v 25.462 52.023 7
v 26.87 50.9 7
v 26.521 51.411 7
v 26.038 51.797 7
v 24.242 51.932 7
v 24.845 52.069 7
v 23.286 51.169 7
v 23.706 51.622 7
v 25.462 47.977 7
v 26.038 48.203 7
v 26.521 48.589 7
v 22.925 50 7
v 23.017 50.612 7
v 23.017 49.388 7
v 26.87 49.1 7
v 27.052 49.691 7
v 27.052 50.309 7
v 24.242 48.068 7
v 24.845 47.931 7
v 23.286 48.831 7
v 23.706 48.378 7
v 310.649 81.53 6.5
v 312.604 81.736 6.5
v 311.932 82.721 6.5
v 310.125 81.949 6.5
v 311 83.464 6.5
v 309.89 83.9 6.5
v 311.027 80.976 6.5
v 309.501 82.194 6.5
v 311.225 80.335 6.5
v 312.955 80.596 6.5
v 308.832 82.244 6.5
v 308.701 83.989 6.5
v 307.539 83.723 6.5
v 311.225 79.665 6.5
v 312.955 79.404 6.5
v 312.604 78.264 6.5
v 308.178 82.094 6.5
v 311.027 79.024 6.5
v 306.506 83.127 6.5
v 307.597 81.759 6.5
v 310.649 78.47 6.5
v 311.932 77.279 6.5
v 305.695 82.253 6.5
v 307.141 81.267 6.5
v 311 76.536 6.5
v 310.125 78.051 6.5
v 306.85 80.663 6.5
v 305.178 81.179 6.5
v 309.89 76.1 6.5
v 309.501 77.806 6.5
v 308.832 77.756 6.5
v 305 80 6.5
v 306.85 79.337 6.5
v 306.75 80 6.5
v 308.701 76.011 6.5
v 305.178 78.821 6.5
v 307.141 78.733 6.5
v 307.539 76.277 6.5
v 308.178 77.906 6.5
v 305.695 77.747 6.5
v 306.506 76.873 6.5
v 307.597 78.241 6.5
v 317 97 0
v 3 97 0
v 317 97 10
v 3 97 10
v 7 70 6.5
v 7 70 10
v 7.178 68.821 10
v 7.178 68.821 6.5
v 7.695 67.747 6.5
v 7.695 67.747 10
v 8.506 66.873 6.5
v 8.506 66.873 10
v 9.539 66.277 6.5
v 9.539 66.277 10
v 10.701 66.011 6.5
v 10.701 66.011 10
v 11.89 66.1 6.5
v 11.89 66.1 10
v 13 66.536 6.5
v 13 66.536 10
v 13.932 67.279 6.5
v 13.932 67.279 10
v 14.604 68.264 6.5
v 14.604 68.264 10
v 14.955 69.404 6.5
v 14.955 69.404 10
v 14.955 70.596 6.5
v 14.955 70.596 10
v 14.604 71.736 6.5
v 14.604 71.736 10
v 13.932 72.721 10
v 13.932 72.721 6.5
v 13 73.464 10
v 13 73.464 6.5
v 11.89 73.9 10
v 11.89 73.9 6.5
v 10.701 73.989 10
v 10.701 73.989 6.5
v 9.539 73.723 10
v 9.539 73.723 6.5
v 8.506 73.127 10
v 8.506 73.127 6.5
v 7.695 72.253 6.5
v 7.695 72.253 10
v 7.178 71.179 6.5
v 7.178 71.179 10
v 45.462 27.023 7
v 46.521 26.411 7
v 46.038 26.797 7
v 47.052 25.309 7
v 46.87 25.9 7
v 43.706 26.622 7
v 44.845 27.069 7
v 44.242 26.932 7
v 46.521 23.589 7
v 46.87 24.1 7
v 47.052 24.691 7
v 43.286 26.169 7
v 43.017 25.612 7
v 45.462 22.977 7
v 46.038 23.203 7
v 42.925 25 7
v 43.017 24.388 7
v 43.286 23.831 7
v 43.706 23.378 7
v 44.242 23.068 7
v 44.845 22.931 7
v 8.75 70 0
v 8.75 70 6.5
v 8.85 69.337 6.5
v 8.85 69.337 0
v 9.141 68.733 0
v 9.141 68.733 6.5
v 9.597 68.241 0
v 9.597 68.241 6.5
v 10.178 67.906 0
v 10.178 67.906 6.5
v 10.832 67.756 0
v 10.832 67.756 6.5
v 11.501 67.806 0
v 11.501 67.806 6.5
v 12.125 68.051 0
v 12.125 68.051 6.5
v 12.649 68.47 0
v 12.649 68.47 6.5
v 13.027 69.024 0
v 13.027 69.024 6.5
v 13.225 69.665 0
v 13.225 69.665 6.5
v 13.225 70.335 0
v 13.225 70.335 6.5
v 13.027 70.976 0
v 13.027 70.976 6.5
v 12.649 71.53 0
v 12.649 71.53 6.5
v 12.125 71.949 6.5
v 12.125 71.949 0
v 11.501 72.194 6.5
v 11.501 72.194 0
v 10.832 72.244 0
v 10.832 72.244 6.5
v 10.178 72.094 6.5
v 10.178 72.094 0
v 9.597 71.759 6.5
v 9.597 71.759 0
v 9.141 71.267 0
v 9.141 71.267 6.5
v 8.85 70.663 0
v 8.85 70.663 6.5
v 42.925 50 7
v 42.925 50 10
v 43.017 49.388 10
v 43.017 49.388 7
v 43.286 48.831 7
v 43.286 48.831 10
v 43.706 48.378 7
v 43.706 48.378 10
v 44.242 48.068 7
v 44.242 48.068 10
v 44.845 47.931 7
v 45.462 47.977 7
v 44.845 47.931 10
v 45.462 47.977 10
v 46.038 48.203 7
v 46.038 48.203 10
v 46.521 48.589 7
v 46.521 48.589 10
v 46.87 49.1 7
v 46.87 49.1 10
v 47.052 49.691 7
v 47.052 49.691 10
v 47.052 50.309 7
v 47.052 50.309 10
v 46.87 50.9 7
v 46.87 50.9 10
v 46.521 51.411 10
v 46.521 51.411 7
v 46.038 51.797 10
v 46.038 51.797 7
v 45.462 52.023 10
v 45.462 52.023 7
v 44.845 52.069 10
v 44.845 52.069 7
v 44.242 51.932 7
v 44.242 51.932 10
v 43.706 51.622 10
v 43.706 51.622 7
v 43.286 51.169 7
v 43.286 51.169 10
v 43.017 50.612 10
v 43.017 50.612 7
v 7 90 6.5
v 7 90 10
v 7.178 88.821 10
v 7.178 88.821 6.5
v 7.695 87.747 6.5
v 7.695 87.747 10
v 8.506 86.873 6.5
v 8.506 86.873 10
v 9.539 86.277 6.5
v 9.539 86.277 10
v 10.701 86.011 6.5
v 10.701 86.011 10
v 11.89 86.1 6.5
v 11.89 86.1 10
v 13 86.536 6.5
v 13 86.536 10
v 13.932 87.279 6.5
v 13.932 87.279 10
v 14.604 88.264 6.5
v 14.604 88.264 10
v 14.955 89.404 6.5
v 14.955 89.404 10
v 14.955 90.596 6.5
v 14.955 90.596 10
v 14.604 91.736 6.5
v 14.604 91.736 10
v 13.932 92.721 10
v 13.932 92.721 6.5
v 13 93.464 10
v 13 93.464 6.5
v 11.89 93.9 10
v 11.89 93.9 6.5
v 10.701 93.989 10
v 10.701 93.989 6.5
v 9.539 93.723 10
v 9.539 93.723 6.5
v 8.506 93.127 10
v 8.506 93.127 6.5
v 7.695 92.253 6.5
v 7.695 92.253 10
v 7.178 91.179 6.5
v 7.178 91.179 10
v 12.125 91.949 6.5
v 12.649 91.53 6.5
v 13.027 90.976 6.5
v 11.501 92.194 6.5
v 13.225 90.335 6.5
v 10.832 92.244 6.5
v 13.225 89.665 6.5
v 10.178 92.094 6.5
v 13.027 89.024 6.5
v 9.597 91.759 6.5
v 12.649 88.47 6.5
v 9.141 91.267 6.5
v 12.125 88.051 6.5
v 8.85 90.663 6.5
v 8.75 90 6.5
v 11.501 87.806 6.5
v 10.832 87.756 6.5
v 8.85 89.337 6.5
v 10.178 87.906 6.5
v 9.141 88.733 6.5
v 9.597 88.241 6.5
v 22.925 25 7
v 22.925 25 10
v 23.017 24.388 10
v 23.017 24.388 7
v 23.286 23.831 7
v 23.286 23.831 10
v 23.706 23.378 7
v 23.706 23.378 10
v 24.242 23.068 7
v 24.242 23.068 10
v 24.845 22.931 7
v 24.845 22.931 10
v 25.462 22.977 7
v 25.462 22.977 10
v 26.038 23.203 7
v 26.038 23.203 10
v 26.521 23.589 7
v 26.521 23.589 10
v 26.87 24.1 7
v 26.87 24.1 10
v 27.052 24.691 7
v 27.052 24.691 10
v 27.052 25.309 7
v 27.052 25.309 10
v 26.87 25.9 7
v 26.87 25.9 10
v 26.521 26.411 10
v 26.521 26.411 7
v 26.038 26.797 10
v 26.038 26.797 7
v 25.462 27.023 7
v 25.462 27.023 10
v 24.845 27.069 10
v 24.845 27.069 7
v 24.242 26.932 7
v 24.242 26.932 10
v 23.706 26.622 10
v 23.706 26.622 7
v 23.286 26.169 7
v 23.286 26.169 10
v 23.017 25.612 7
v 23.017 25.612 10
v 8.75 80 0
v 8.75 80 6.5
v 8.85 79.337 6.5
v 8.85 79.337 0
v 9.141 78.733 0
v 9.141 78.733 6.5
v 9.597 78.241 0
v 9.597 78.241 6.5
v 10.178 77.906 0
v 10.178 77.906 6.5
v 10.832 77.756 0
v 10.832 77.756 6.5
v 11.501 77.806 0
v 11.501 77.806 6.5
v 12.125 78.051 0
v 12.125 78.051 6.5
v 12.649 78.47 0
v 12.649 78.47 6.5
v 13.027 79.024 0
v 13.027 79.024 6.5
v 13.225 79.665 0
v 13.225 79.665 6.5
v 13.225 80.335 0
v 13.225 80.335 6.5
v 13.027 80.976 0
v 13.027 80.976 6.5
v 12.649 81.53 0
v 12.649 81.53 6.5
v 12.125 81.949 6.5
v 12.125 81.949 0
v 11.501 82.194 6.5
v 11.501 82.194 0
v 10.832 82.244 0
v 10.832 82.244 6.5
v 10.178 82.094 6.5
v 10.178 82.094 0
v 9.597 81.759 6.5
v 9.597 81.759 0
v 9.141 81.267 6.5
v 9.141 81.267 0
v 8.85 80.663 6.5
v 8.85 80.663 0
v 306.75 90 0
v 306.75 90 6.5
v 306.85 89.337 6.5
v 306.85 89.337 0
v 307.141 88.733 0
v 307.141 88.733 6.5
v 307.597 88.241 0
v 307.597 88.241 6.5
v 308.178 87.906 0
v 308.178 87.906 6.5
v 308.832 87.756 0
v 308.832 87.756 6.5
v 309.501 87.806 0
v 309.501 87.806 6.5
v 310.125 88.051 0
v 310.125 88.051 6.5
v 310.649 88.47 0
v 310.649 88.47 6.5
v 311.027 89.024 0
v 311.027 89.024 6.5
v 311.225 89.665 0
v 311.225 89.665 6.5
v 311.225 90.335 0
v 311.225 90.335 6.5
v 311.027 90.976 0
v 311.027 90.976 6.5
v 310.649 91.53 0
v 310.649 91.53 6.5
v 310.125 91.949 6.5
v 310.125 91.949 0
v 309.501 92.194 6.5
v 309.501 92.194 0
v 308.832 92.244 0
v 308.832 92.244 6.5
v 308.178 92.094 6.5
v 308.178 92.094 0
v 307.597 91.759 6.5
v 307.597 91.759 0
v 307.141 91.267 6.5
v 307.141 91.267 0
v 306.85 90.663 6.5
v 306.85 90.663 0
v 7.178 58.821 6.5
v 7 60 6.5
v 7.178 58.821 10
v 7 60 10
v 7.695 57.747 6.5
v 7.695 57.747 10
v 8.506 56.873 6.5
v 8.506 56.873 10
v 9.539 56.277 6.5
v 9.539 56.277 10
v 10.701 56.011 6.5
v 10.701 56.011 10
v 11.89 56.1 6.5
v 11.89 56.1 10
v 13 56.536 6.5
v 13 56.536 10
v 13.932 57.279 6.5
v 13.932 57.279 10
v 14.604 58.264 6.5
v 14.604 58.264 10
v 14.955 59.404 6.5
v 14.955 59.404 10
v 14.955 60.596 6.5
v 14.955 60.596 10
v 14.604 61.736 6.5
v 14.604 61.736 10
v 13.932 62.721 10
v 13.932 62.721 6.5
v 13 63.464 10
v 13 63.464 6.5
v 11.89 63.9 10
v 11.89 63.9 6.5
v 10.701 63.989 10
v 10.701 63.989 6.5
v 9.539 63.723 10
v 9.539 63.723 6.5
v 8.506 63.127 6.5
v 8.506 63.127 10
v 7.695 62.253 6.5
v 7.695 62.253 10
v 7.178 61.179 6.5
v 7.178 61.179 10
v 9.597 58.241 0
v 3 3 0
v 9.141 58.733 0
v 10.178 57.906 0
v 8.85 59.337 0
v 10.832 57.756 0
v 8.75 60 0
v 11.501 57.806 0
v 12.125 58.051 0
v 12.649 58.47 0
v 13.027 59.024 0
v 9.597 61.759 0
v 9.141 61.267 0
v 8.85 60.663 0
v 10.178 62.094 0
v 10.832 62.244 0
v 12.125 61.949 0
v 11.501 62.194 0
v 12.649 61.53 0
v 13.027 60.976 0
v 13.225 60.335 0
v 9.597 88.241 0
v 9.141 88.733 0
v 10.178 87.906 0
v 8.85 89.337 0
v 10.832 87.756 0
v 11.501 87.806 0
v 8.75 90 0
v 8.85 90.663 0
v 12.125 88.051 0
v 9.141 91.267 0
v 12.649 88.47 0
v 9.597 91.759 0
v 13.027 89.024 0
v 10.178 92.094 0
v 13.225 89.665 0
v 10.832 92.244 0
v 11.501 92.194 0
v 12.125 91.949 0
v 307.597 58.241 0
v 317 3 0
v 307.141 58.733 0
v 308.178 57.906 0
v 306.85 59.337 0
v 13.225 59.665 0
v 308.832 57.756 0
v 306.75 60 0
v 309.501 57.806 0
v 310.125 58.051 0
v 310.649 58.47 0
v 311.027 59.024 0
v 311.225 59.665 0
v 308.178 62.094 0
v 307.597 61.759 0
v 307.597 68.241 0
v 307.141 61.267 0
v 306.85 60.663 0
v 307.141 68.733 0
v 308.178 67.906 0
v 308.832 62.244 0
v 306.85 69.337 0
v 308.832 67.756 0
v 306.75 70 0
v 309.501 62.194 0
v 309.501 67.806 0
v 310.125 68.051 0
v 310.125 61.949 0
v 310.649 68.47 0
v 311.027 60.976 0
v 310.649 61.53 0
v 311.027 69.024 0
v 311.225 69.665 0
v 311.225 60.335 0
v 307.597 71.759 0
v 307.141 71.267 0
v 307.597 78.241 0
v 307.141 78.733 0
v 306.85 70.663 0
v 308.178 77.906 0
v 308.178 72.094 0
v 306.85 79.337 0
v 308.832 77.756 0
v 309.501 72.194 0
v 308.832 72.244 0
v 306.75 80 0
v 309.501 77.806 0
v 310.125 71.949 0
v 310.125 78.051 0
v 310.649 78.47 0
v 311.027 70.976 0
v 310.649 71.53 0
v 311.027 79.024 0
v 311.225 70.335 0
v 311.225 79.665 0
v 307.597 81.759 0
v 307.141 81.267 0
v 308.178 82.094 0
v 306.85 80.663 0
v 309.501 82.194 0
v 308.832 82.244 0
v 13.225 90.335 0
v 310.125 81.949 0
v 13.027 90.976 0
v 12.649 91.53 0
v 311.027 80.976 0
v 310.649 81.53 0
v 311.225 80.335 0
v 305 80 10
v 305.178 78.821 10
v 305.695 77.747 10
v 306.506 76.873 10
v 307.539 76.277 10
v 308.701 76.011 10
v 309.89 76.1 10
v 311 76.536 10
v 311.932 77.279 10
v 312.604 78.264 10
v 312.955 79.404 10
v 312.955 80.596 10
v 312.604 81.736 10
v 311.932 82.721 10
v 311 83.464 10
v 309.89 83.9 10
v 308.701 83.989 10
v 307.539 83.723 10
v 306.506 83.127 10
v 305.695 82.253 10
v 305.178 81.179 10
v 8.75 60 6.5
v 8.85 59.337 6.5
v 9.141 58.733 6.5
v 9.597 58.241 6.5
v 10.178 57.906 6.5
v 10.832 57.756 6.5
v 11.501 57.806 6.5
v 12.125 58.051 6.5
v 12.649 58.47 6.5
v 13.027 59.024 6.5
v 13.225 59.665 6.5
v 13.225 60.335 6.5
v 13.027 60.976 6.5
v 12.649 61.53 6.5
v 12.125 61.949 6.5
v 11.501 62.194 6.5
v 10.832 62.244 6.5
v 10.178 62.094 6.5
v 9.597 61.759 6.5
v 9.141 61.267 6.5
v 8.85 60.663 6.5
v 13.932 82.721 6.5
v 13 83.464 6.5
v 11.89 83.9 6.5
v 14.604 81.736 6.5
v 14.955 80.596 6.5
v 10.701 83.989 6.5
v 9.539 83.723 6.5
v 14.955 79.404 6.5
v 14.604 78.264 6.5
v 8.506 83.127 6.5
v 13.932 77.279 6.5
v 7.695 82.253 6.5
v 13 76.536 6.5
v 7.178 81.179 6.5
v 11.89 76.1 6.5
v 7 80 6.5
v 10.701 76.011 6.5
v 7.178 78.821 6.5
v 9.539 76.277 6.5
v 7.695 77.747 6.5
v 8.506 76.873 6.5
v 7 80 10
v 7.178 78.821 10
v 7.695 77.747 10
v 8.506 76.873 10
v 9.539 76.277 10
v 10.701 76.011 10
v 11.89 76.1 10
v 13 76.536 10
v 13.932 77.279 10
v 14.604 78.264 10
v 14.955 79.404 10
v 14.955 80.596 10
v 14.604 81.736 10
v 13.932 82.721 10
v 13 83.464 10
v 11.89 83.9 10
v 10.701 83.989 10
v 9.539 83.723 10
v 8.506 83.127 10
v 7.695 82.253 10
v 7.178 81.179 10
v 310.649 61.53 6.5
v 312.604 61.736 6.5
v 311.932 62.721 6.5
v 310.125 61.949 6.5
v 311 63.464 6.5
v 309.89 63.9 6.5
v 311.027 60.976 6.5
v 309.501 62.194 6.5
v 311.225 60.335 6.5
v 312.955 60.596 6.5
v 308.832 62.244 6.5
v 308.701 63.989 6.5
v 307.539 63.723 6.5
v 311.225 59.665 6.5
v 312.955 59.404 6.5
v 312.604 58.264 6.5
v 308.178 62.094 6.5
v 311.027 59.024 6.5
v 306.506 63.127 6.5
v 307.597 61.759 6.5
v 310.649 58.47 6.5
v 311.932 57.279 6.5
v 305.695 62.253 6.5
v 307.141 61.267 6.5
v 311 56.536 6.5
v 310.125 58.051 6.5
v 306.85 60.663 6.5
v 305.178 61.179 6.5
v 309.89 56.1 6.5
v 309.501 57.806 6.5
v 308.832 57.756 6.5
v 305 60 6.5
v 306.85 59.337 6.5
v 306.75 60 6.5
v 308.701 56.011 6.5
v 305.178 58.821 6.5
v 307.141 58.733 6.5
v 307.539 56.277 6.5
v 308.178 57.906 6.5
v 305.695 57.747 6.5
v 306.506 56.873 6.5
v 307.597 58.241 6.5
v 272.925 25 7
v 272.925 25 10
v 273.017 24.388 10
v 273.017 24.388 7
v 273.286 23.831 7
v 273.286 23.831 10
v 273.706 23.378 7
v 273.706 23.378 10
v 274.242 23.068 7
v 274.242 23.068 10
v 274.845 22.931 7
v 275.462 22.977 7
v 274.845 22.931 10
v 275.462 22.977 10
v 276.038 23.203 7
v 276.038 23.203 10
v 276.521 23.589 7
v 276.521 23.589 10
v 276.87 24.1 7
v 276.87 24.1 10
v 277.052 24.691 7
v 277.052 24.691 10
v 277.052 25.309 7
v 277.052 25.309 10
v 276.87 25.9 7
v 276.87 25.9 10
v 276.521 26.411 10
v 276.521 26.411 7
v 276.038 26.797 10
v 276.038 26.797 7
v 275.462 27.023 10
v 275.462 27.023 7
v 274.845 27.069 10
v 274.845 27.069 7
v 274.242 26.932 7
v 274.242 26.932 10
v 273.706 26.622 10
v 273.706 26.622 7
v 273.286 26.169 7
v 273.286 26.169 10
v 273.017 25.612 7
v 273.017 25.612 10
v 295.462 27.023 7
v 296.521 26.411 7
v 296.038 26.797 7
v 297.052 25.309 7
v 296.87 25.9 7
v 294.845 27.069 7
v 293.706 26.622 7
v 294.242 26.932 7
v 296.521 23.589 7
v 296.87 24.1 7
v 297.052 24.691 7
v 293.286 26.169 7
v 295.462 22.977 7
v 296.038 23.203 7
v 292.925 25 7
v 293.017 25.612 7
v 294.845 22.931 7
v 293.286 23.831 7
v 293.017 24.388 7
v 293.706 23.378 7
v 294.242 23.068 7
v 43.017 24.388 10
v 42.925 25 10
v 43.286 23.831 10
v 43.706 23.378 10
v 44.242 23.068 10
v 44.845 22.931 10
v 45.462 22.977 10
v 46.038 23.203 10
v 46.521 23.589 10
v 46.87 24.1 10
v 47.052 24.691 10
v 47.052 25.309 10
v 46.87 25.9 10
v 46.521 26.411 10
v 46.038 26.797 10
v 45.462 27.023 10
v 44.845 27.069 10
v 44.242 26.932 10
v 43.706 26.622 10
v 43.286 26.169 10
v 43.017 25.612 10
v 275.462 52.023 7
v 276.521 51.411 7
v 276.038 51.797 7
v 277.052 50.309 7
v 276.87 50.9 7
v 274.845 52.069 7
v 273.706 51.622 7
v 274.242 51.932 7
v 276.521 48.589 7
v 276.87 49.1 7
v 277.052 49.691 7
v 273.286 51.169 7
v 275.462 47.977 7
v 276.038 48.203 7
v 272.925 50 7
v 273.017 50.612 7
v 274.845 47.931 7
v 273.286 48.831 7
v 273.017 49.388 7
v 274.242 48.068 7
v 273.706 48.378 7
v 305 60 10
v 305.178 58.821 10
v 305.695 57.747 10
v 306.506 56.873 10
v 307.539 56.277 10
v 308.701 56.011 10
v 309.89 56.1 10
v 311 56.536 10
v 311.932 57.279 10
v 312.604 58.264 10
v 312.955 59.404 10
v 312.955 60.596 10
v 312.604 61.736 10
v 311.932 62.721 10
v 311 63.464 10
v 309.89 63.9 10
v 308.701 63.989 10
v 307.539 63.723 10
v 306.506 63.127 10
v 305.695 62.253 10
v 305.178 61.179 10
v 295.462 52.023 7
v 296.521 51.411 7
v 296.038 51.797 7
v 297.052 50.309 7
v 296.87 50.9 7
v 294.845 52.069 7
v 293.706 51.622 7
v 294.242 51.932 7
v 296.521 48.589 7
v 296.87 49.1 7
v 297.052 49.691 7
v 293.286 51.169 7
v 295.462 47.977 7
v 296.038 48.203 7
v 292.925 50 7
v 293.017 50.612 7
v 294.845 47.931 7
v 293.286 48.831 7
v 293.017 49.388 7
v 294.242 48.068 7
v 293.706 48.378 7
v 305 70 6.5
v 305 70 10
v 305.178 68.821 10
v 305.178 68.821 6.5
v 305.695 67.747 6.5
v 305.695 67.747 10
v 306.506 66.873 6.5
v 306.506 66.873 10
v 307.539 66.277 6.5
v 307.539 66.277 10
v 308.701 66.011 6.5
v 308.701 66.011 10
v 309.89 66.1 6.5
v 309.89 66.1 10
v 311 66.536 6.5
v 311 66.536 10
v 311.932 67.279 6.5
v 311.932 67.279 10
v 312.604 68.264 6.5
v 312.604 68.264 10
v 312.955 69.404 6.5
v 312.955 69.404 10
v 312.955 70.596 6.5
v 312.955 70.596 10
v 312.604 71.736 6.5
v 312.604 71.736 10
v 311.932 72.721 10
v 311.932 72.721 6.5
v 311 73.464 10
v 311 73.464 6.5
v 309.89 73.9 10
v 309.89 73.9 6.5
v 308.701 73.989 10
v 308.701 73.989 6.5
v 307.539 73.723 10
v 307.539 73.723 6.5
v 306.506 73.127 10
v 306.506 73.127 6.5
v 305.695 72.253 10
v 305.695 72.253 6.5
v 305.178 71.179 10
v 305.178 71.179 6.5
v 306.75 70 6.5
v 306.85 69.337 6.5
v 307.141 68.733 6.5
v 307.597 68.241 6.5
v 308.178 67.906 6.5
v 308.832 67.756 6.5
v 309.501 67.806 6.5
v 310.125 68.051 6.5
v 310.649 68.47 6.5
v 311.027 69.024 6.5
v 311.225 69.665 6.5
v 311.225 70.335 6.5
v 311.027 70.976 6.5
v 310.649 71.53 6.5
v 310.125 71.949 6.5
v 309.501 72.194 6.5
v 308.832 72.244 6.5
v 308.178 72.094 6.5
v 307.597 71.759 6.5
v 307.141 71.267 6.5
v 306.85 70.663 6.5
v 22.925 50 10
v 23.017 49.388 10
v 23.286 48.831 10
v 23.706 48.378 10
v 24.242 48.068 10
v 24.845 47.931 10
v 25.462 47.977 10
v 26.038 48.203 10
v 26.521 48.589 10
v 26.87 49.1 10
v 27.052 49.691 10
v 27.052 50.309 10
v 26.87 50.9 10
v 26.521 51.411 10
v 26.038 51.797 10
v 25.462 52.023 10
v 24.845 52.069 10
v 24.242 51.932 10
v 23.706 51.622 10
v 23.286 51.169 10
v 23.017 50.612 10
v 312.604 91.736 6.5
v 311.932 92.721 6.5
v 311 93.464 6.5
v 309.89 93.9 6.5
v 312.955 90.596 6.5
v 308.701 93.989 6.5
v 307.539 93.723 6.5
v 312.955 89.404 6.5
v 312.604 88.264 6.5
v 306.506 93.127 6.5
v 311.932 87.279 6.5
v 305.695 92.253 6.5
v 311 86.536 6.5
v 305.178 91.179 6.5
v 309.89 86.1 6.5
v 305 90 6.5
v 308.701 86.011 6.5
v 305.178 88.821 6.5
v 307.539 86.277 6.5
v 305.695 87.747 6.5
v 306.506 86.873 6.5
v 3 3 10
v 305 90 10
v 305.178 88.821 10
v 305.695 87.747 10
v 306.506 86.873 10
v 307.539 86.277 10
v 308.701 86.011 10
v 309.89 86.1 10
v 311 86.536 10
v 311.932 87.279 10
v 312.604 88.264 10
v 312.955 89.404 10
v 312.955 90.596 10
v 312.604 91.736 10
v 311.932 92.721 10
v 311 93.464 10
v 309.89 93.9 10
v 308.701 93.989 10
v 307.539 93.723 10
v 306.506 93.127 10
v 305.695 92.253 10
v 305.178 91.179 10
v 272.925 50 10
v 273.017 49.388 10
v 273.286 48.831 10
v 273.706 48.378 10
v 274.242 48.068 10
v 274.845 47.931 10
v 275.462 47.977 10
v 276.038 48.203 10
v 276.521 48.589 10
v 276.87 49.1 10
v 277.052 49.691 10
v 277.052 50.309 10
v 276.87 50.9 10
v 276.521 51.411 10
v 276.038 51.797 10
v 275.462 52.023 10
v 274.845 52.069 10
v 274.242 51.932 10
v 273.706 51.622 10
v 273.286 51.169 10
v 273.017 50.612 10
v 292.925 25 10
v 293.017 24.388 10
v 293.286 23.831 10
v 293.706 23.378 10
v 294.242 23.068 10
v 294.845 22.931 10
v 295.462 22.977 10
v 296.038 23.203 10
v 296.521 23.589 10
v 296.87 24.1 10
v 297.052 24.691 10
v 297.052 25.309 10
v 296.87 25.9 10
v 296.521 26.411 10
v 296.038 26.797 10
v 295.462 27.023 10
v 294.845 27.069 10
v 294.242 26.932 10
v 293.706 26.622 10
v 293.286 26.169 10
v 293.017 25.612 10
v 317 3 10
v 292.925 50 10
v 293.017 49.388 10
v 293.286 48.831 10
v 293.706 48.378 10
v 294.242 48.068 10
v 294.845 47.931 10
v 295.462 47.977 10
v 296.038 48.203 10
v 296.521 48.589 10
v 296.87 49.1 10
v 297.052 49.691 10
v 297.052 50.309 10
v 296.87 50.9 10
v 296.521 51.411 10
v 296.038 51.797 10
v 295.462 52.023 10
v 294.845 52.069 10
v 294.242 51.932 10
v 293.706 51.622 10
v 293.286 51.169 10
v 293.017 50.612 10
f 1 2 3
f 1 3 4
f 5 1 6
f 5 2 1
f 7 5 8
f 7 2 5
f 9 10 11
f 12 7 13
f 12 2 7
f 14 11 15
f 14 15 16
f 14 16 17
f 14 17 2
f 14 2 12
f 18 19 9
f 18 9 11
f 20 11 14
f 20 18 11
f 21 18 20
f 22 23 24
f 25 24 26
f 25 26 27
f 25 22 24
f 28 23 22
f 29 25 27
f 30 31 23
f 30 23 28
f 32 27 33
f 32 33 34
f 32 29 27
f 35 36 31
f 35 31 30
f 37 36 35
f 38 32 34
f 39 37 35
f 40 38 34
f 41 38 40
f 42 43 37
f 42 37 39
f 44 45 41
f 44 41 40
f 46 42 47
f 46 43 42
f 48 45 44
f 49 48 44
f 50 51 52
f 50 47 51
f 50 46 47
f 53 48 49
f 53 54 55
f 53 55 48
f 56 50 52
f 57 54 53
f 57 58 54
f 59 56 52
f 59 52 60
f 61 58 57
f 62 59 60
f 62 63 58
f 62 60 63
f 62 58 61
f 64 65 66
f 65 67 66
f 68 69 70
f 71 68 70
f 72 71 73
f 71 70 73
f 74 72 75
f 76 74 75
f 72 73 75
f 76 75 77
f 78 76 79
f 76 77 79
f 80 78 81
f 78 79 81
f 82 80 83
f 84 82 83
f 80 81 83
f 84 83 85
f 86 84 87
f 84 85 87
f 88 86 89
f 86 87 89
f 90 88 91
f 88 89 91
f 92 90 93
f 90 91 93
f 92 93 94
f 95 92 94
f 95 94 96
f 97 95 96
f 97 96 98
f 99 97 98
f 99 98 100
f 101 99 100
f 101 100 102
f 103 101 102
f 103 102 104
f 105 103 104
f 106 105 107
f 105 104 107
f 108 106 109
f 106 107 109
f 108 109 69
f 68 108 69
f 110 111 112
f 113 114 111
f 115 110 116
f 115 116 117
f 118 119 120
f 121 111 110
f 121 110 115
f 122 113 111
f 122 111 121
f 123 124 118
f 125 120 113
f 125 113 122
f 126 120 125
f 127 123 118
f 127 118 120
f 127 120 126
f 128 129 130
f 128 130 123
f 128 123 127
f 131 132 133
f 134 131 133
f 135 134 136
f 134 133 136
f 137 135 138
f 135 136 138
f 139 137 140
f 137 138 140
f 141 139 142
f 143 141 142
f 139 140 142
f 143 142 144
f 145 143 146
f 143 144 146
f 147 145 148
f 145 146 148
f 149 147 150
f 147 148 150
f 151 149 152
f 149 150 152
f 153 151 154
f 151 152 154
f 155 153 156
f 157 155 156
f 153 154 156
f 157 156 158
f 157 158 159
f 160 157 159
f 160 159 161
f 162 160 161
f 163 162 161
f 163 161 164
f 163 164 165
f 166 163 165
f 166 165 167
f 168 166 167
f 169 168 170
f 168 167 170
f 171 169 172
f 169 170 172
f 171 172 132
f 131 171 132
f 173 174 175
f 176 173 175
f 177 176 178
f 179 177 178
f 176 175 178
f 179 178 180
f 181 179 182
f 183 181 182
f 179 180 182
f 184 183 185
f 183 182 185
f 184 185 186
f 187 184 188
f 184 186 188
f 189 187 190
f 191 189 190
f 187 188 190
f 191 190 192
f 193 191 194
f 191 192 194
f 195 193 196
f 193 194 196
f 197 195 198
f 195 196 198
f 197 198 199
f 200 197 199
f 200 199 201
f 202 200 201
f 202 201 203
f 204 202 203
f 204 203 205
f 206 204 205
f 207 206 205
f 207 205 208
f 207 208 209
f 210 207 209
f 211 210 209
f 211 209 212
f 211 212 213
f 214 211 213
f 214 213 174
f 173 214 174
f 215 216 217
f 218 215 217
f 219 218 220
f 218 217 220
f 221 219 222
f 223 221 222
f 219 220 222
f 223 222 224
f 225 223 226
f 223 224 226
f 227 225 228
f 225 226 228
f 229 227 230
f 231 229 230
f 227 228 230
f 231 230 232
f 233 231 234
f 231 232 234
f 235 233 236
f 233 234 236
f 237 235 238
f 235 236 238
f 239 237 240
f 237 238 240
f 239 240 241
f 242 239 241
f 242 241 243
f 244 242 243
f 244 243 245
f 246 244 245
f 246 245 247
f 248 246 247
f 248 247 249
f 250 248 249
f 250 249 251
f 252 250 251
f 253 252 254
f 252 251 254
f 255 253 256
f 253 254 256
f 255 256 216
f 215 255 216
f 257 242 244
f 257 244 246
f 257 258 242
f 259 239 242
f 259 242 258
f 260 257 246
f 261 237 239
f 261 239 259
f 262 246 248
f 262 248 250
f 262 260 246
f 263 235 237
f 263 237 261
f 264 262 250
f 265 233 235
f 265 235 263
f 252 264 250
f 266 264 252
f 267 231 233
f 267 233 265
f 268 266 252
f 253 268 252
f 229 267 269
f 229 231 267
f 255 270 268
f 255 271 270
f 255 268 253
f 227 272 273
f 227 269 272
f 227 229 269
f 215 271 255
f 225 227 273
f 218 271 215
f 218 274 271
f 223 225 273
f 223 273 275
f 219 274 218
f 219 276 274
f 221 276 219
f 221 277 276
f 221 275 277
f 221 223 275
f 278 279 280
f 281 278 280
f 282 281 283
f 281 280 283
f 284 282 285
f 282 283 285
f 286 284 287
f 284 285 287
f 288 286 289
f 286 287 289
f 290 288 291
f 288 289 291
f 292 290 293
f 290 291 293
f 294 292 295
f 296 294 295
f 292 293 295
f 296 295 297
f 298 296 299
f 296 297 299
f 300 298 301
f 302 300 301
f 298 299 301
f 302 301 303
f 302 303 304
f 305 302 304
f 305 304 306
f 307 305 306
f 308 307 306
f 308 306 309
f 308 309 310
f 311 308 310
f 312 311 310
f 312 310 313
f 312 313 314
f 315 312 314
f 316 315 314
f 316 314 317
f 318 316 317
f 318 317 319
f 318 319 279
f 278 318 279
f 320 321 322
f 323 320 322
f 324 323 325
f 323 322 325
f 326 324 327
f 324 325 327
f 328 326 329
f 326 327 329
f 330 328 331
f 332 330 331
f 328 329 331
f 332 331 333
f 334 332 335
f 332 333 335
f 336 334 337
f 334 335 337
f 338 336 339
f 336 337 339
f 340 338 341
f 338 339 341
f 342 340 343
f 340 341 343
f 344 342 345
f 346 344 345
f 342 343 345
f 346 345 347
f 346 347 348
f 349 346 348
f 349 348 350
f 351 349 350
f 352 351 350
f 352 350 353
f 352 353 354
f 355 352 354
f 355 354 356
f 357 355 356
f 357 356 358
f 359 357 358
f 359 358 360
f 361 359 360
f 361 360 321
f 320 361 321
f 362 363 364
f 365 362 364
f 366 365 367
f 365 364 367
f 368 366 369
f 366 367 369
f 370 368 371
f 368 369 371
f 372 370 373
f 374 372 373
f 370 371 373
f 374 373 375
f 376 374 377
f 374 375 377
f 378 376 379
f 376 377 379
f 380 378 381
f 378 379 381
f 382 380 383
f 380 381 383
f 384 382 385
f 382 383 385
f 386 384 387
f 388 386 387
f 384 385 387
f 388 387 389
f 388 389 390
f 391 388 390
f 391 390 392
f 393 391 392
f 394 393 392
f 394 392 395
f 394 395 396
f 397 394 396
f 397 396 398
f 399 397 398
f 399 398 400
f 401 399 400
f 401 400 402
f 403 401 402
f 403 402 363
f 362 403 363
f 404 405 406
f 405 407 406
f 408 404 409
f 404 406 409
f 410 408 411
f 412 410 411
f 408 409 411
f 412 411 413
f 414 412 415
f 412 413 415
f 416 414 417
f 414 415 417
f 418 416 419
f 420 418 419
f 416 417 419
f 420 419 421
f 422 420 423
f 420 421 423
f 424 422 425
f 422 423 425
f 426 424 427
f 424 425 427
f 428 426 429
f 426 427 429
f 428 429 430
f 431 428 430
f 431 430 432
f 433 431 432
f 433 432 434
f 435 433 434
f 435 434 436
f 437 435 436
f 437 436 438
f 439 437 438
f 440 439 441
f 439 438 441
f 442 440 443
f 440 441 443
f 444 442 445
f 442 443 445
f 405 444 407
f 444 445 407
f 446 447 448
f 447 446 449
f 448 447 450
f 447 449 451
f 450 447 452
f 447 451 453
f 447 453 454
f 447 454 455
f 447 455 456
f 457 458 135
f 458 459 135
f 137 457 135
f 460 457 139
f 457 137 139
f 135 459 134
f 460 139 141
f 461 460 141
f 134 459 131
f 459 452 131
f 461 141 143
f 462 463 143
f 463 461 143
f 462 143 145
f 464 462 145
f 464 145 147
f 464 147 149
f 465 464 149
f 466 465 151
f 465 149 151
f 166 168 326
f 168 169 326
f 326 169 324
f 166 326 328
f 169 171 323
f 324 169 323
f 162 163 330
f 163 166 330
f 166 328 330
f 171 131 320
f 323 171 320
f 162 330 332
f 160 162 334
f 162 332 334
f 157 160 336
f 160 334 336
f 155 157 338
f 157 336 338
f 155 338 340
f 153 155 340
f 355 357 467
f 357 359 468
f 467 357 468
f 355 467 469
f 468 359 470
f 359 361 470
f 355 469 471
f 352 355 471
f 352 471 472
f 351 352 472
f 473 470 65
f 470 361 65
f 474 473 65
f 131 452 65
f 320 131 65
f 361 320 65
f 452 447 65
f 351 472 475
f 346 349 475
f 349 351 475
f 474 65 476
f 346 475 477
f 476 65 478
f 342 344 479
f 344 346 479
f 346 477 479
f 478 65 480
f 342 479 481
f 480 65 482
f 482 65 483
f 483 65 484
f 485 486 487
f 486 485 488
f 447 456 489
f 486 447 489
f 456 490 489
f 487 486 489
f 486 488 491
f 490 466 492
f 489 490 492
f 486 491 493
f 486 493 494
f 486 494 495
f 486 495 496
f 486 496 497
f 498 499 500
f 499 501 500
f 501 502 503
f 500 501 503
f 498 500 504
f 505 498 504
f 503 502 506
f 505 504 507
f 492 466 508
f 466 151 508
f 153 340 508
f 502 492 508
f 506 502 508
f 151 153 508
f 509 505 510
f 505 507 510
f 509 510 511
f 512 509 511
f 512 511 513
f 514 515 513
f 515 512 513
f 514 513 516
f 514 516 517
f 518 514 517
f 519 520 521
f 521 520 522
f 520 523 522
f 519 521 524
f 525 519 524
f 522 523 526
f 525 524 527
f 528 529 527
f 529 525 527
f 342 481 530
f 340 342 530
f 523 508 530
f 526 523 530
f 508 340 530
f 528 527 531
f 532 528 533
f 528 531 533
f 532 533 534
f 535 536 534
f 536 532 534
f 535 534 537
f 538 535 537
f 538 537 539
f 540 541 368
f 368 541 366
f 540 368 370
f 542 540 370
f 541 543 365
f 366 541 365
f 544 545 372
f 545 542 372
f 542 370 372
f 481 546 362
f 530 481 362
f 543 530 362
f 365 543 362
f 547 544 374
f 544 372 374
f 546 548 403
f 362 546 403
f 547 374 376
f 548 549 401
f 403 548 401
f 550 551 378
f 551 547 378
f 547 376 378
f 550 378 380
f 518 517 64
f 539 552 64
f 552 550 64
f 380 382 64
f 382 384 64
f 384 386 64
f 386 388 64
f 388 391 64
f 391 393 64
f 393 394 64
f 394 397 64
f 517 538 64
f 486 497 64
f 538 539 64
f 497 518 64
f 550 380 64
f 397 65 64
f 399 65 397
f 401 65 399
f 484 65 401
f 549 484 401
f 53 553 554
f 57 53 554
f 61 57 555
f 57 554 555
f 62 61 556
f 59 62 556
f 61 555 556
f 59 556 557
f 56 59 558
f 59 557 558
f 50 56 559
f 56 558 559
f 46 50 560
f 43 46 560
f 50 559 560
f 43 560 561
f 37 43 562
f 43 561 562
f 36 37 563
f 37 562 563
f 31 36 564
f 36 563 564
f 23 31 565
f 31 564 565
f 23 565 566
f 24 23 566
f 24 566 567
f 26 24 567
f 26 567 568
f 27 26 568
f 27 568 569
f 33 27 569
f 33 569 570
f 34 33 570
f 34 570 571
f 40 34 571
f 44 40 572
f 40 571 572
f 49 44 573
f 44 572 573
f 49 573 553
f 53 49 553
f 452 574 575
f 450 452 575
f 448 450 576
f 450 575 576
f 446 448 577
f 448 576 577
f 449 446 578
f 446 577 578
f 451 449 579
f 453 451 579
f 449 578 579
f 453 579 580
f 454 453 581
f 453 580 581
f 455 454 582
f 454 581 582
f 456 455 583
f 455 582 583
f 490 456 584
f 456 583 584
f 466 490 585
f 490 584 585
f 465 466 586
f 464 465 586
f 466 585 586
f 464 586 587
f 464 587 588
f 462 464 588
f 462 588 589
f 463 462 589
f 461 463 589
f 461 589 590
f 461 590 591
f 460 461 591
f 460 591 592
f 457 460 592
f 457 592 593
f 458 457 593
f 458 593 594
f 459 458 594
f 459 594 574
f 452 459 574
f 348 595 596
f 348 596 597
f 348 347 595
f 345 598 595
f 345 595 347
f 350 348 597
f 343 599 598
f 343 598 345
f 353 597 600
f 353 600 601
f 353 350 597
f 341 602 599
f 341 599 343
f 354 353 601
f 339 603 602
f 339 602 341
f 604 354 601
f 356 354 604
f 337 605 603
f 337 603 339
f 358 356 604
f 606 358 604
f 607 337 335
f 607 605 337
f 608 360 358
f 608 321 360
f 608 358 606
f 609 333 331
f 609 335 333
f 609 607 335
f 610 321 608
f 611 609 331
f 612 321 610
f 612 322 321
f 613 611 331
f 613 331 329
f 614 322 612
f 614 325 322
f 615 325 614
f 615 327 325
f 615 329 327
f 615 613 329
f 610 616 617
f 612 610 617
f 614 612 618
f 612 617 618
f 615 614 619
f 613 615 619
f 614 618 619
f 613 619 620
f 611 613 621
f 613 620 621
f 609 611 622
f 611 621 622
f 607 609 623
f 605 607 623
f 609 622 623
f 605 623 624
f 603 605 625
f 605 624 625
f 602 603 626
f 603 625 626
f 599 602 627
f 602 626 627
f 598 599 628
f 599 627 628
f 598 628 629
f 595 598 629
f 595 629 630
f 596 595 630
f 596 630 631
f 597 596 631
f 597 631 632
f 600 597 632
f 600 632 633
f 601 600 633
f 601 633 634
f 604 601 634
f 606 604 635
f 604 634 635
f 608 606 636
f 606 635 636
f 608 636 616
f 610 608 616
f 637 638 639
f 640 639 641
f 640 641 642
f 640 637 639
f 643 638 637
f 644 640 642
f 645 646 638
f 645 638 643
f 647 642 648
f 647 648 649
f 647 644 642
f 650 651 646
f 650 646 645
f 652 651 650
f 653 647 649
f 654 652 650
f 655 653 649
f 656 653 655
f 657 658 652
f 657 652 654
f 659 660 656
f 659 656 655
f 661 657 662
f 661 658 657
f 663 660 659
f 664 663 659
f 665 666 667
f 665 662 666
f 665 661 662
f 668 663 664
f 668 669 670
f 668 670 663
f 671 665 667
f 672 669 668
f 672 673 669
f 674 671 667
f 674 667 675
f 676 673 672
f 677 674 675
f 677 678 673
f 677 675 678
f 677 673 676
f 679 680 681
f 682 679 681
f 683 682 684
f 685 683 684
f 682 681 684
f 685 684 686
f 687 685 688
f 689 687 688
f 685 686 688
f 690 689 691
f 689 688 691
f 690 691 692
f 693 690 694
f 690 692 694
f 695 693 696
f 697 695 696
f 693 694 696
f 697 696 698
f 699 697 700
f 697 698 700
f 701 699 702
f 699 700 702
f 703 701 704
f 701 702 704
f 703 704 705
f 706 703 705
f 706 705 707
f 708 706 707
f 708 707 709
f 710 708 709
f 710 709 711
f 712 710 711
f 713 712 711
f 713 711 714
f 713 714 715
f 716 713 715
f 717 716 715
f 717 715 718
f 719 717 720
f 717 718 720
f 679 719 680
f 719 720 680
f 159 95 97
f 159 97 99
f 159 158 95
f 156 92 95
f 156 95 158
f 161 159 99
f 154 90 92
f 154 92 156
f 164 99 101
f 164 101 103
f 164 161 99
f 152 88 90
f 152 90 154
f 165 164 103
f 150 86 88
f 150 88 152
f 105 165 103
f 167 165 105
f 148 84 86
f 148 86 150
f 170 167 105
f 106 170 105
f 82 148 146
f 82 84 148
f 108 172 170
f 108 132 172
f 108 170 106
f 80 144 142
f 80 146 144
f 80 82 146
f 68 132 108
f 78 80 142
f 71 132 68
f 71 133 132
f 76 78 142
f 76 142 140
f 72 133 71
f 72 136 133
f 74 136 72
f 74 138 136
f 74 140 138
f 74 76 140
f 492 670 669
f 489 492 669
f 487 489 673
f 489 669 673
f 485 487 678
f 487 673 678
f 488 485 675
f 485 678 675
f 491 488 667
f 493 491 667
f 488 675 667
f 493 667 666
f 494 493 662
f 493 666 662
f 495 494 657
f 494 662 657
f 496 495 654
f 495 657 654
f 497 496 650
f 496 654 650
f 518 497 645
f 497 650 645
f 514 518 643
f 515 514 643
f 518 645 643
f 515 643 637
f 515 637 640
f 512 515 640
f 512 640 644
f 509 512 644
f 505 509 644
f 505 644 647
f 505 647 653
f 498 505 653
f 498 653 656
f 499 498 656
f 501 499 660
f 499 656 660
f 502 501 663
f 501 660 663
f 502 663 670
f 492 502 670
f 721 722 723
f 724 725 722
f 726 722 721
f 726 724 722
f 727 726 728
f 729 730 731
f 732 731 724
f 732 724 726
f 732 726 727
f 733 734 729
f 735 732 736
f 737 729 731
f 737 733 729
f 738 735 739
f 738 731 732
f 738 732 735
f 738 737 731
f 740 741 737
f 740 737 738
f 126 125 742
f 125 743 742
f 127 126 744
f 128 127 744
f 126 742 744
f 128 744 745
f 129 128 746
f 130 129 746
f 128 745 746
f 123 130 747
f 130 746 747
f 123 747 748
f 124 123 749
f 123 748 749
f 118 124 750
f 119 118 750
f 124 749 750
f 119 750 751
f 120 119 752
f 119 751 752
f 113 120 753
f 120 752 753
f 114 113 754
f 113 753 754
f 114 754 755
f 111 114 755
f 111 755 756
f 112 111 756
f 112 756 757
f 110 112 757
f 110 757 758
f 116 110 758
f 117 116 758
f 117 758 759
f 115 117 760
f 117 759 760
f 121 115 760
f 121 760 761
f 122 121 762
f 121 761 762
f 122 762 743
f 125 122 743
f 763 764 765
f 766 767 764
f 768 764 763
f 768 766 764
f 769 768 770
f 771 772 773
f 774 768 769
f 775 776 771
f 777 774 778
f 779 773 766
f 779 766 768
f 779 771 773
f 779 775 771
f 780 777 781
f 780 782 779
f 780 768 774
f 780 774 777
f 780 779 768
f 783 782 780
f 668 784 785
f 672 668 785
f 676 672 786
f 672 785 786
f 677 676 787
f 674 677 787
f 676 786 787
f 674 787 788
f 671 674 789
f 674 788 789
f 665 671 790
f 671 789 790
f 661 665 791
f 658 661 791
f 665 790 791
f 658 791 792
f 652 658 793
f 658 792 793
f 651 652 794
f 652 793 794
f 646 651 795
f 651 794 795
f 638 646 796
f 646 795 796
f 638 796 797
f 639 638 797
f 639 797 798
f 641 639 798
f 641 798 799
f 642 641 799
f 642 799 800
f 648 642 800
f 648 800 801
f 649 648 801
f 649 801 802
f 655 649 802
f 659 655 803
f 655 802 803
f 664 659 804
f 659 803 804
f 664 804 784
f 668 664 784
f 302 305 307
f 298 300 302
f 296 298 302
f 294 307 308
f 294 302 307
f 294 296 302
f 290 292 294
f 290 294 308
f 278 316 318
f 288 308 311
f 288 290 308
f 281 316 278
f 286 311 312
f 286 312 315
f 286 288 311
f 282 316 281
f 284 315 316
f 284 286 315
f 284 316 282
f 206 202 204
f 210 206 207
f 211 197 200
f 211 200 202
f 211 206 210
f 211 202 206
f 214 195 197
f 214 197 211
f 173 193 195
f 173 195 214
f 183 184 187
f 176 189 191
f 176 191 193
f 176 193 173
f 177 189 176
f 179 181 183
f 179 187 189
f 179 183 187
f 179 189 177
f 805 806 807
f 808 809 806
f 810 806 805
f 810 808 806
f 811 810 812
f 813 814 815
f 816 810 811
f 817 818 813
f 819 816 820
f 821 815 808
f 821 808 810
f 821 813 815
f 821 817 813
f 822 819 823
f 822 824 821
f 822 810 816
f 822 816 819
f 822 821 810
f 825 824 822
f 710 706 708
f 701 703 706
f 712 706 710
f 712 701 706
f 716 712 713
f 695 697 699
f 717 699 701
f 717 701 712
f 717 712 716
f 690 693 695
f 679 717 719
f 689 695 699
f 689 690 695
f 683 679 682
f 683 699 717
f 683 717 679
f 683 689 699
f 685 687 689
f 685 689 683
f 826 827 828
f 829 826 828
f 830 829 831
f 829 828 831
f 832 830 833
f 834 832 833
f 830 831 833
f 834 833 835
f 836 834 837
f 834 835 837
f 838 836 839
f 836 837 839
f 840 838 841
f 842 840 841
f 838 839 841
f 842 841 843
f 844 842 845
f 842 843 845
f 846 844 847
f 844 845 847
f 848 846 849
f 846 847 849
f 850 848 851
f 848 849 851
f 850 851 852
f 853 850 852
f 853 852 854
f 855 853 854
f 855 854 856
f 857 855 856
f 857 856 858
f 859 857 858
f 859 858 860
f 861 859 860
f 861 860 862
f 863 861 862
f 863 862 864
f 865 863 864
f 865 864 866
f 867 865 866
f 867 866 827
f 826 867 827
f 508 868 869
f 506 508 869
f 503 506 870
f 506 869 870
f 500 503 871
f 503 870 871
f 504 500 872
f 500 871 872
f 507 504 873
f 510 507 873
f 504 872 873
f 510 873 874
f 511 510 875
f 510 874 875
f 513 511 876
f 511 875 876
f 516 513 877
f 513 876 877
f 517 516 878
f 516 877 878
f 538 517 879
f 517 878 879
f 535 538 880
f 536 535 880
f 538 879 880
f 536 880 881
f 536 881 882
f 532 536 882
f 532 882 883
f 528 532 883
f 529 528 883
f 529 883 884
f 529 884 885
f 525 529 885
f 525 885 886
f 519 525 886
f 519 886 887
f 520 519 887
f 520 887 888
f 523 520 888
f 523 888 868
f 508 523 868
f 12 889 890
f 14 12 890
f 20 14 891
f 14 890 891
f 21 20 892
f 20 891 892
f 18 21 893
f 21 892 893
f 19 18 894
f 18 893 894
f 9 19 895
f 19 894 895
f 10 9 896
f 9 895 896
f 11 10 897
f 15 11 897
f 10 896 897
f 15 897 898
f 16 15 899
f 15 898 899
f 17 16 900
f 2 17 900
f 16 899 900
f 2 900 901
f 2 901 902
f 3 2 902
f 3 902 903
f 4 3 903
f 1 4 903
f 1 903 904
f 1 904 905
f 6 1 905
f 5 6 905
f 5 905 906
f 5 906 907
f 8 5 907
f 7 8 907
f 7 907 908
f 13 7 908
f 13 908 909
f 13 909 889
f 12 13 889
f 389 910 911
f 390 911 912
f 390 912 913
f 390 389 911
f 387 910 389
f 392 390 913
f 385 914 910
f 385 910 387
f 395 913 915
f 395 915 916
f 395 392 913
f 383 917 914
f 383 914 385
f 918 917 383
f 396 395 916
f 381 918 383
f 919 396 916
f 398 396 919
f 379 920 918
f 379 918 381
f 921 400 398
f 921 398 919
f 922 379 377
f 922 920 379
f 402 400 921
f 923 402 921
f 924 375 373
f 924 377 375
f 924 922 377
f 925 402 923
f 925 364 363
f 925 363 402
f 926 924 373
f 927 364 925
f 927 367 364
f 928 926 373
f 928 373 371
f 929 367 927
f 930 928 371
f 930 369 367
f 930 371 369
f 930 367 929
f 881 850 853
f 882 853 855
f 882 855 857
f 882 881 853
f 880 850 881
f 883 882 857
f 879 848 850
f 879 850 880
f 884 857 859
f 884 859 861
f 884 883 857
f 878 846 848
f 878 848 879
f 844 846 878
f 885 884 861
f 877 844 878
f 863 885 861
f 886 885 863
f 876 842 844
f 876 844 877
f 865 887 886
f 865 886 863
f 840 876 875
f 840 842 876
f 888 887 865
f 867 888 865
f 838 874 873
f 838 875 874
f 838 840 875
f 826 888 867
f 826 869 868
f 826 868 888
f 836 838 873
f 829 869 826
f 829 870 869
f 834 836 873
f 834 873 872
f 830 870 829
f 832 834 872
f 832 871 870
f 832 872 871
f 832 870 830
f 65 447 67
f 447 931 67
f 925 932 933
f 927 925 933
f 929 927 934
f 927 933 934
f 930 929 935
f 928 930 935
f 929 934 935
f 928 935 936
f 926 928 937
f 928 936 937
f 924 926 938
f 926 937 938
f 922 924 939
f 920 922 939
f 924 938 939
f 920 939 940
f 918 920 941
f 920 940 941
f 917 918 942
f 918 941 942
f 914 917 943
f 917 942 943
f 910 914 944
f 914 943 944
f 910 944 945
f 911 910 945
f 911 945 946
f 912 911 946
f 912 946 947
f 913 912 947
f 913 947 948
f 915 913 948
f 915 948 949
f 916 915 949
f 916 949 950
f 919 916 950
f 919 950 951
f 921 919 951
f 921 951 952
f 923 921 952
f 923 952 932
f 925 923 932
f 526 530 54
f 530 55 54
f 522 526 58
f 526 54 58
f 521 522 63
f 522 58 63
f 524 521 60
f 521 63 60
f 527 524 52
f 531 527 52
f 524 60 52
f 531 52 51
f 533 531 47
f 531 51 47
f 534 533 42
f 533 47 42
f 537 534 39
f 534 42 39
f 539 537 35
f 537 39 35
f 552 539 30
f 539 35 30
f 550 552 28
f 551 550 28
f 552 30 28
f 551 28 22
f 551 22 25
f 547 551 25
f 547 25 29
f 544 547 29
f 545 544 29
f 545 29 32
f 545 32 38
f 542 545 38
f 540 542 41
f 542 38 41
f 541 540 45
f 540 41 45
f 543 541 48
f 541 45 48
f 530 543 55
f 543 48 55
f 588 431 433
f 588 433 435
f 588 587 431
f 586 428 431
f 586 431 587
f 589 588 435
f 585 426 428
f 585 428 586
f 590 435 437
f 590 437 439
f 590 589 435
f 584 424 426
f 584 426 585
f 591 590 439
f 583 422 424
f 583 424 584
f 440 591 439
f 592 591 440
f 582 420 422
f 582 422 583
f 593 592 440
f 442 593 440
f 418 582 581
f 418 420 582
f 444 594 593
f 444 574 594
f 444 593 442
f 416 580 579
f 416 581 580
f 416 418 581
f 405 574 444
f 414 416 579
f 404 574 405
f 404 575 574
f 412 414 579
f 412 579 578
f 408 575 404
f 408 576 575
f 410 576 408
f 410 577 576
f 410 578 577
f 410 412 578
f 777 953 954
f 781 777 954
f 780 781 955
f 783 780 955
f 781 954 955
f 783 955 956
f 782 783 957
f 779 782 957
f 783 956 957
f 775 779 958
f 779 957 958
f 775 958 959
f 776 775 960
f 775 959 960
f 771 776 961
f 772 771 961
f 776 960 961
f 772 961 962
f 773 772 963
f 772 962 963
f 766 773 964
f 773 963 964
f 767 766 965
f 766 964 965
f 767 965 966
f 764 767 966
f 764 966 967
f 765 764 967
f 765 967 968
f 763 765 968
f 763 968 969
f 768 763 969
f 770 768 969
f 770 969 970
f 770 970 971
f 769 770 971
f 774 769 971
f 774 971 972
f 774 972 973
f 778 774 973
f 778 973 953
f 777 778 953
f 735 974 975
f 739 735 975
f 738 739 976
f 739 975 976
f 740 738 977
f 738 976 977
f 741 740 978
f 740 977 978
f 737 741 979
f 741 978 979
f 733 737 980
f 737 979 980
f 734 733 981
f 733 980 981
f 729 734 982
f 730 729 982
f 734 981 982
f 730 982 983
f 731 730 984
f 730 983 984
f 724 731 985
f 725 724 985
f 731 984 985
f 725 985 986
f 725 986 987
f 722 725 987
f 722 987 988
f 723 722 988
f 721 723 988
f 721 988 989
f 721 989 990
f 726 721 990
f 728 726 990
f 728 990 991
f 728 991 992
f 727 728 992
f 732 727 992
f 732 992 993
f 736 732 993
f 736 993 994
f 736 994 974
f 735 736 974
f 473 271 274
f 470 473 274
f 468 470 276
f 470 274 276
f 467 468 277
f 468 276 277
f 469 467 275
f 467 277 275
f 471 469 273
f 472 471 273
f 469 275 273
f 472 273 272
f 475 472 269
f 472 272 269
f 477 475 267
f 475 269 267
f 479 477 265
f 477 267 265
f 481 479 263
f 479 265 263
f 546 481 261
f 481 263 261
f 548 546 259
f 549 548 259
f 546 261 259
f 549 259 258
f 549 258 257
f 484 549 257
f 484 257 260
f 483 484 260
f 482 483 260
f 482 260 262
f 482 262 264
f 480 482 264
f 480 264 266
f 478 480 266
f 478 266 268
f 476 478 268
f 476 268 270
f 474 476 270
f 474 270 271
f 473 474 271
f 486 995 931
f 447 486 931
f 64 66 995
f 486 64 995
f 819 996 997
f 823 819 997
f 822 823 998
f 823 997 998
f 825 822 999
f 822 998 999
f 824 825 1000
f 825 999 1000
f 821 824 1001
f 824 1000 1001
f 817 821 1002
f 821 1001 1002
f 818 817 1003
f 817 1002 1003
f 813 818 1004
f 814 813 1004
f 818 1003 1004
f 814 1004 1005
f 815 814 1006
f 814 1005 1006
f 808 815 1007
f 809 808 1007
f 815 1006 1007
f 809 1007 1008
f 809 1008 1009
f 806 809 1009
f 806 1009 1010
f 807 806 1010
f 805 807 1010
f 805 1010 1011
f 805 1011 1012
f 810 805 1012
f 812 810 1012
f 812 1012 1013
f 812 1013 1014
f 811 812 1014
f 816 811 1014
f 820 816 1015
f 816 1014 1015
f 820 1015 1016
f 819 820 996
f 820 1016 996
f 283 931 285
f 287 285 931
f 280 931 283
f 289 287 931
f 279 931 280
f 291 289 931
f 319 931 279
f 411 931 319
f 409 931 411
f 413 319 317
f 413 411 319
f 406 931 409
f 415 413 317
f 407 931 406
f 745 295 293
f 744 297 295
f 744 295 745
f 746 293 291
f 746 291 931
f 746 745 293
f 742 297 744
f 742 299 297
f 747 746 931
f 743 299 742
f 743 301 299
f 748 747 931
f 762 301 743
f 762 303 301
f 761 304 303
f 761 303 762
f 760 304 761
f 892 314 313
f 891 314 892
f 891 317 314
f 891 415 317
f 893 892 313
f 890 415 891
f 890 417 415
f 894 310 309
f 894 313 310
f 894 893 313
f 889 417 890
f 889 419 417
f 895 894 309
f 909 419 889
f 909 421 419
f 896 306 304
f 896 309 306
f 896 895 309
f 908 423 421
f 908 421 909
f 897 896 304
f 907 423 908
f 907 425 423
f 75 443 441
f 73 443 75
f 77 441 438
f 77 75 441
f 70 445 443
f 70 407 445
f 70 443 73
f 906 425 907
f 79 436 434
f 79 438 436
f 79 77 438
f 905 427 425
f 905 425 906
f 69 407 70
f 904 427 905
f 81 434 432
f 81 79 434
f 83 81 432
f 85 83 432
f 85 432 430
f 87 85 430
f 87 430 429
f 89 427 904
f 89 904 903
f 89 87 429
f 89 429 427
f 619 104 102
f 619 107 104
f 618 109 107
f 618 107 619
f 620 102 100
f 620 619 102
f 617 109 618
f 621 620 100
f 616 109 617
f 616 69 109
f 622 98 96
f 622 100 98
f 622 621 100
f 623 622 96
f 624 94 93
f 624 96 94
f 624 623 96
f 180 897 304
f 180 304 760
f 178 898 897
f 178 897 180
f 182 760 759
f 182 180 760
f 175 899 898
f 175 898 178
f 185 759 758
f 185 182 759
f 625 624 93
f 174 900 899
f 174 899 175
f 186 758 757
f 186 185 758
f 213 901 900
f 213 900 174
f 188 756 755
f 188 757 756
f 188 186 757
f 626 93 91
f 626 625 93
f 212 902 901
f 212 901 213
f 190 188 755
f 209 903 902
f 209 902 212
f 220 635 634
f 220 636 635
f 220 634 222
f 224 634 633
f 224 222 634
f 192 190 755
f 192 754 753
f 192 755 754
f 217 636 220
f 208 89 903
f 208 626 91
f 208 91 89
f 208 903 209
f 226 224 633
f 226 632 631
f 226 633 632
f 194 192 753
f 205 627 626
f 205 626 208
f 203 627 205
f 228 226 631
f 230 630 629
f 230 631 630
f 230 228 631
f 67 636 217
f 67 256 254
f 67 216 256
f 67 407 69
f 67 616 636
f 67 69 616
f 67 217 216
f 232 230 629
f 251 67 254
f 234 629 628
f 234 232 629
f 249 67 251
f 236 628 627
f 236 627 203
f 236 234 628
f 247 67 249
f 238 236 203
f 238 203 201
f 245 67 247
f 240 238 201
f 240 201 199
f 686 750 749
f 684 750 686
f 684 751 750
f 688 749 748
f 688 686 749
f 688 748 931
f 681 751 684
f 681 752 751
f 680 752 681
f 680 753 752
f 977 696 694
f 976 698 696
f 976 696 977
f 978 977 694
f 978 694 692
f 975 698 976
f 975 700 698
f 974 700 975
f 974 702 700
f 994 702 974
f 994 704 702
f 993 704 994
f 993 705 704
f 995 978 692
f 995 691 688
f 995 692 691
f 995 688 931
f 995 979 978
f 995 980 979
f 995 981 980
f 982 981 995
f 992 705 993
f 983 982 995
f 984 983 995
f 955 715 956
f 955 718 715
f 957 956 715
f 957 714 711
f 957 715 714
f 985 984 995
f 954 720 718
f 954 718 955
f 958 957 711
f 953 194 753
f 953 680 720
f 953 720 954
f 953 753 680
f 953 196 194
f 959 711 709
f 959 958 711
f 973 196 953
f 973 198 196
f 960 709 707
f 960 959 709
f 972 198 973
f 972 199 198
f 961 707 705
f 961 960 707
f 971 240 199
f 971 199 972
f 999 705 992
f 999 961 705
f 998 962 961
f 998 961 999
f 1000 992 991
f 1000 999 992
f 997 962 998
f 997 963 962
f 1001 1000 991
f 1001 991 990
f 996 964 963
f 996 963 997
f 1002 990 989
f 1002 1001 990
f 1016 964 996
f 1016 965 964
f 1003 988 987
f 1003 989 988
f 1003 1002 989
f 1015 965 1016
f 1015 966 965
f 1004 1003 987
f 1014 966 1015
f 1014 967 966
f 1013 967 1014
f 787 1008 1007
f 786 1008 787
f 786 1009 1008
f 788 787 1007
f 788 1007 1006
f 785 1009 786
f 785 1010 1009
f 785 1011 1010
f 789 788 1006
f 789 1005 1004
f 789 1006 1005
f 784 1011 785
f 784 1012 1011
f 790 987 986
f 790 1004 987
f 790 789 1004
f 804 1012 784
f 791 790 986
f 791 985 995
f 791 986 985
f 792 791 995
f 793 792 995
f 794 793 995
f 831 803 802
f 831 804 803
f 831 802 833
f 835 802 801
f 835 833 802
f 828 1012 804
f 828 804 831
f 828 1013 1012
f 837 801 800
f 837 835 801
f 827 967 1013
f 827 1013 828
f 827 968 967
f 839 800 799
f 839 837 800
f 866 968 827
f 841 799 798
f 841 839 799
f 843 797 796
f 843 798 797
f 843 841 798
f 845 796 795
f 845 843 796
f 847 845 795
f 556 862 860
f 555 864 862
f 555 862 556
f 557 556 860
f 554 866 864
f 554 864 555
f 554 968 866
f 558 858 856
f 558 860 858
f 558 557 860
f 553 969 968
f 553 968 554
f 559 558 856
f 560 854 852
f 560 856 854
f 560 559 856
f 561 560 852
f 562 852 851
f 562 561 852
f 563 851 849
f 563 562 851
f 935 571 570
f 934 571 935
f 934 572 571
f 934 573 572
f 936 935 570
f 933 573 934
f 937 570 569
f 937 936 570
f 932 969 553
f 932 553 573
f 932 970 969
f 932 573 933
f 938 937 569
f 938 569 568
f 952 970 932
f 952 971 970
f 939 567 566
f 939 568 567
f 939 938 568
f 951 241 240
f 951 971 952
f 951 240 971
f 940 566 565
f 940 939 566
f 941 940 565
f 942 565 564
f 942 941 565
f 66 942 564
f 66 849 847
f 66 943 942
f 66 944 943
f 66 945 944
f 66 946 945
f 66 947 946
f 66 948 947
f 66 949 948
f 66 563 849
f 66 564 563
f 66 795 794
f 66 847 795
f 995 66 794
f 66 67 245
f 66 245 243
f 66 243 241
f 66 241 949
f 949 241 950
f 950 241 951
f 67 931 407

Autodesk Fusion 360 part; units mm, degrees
sketch "Sketch1" plane through (0, 0, 0) normal (0, 0, 1) x (1, 0, 0)
  line L0 (0, 0) -> (320, 0)
  line L1 (320, 0) -> (320, 100)
  line L2 (320, 100) -> (0, 100)
  line L3 (0, 100) -> (0, 0)
  dimension "d1" = 320
  dimension "d2" = 100
extrude "Extrude1" add sketch "Sketch1" along normal blind 10
sketch "Sketch2" plane through (0, 0, 10) normal (0, 0, 1) x (-1, 0, 0)
  line L0 (0, -100) -> (0, 0)
  line L1 (0, 0) -> (-320, 0)
  line L2 (-320, 0) -> (-320, -100)
  line L3 (-320, -100) -> (0, -100)
  circle A0 centre (-11, -90) radius 2.25
  circle A1 centre (-309, -90) radius 2.25
  circle A2 centre (-11, -80) radius 2.25
  circle A3 centre (-309, -80) radius 2.25
  circle A4 centre (-11, -70) radius 2.25
  circle A5 centre (-11, -60) radius 2.25
  circle A6 centre (-309, -70) radius 2.25
  circle A7 centre (-309, -60) radius 2.25
  dimension "d5" = 4.5
  dimension "d6" = 4.5
  dimension "d7" = 298
  dimension "d8" = 11
  dimension "d9" = 10
  dimension "d10" = 4.5
  dimension "d11" = 4.5
  dimension "d13" = 4.5
  dimension "d14" = 4.5
  dimension "d16" = 4.5
  dimension "d17" = 4.5
extrude "Extrude2" cut sketch "Sketch2" against normal blind 30 contours A0 | A1 | A2 | A3 | A4 | A5 | A6 | A7
sketch "Sketch3" plane through (0, 0, 10) normal (0, 0, 1) x (-1, 0, 0)
  circle A0 centre (-309, -80) radius 2.25
  circle A1 centre (-11, -80) radius 2.25
  circle A2 centre (-11, -70) radius 2.25
  circle A3 centre (-309, -70) radius 2.25
  circle A4 centre (-309, -90) radius 2.25
  circle A5 centre (-11, -90) radius 2.25
  circle A6 centre (-11, -60) radius 2.25
  circle A7 centre (-309, -60) radius 2.25
  line L0 (0, -100) -> (0, 0)
  line L1 (0, 0) -> (-320, 0)
  line L2 (-320, 0) -> (-320, -100)
  line L3 (-320, -100) -> (0, -100)
  circle A8 centre (-11, -90) radius 4
  dimension "d23" = 8
extrude "Extrude3" cut sketch "Sketch3" against normal blind 3.5 contours A8
pattern_linear "R-Pattern1" count 4 spacing 10 along (0, -1, 0) count 2 spacing 298 along (1, 0, 0) of "Extrude3"
sketch "Sketch4" plane through (0, 0, 10) normal (0, 0, 1) x (-1, 0, 0)
  circle A0 centre (-309, -60) radius 4
  circle A1 centre (-309, -70) radius 4
  circle A2 centre (-309, -80) radius 4
  circle A3 centre (-309, -90) radius 4
  circle A4 centre (-11, -60) radius 4
  circle A5 centre (-11, -70) radius 4
  circle A6 centre (-11, -80) radius 4
  circle A7 centre (-11, -90) radius 4
  line L0 (0, -100) -> (0, 0)
  line L1 (0, 0) -> (-320, 0)
  line L2 (-320, 0) -> (-320, -100)
  line L3 (-320, -100) -> (0, -100)
  line L4 (-317, -3) -> (-3, -3)
  line L5 (-3, -3) -> (-3, -97)
  line L6 (-3, -97) -> (-317, -97)
  line L7 (-317, -97) -> (-317, -3)
extrude "Extrude4" add sketch "Sketch4" along normal blind 5 contours L0 L1 L2 L3
sketch "Sketch5" plane through (0, 0, 10) normal (0, 0, 1) x (-1, 0, 0)
  line L0 (-3, -97) -> (-3, -3)
  line L1 (-3, -3) -> (-317, -3)
  line L2 (-317, -3) -> (-317, -97)
  line L3 (-317, -97) -> (-3, -97)
  circle A0 centre (-309, -60) radius 4
  circle A1 centre (-309, -70) radius 4
  circle A2 centre (-309, -80) radius 4
  circle A3 centre (-309, -90) radius 4
  circle A4 centre (-11, -60) radius 4
  circle A5 centre (-11, -70) radius 4
  circle A6 centre (-11, -80) radius 4
  circle A7 centre (-11, -90) radius 4
  circle A8 centre (-25, -50) radius 2.075
  circle A9 centre (-25, -25) radius 2.075
  circle A10 centre (-295, -50) radius 2.075
  circle A11 centre (-295, -25) radius 2.075
  dimension "d32" = 4.15
  dimension "d33" = 4.15
  dimension "d34" = 4.15
  dimension "d35" = 4.15
extrude "Extrude5" add sketch "Sketch5" along normal blind 3 contours A8 | A9 | A10 | A11
sketch "Sketch6" plane through (0, 0, 10) normal (0, 0, 1) x (-1, 0, 0)
  circle A0 centre (-295, -25) radius 2.075
  circle A1 centre (-25, -50) radius 2.075
  circle A2 centre (-295, -50) radius 2.075
  circle A3 centre (-25, -25) radius 2.075
  line L0 (-3, -97) -> (-3, -3)
  line L1 (-3, -3) -> (-317, -3)
  line L2 (-317, -3) -> (-317, -97)
  line L3 (-317, -97) -> (-3, -97)
  circle A4 centre (-309, -60) radius 4
  circle A5 centre (-309, -70) radius 4
  circle A6 centre (-309, -80) radius 4
  circle A7 centre (-309, -90) radius 4
  circle A8 centre (-11, -60) radius 4
  circle A9 centre (-11, -70) radius 4
  circle A10 centre (-11, -80) radius 4
  circle A11 centre (-11, -90) radius 4
  circle A12 centre (-45, -50) radius 2.075
  circle A13 centre (-45, -25) radius 2.075
  circle A14 centre (-275, -50) radius 2.075
  circle A15 centre (-275, -25) radius 2.075
  dimension "d38" = 4.15
  dimension "d39" = 4.15
  dimension "d40" = 4.15
  dimension "d41" = 4.15
extrude "Extrude6" cut sketch "Sketch6" against normal blind 3 contours A12 | A13 | A14 | A15
extrude "Extrude7" cut 1 faces at (212.3333, 1, 15) along direction (0, 0, -1) blind 15
extrude "Extrude8" cut 4 faces at (24.3391, 50.0023, 13) (25.1539, 24.4763, 13) (295.5715, 25.5958, 13) (294.4285, 49.4042, 13) along direction (0, 0, -1) blind 6
